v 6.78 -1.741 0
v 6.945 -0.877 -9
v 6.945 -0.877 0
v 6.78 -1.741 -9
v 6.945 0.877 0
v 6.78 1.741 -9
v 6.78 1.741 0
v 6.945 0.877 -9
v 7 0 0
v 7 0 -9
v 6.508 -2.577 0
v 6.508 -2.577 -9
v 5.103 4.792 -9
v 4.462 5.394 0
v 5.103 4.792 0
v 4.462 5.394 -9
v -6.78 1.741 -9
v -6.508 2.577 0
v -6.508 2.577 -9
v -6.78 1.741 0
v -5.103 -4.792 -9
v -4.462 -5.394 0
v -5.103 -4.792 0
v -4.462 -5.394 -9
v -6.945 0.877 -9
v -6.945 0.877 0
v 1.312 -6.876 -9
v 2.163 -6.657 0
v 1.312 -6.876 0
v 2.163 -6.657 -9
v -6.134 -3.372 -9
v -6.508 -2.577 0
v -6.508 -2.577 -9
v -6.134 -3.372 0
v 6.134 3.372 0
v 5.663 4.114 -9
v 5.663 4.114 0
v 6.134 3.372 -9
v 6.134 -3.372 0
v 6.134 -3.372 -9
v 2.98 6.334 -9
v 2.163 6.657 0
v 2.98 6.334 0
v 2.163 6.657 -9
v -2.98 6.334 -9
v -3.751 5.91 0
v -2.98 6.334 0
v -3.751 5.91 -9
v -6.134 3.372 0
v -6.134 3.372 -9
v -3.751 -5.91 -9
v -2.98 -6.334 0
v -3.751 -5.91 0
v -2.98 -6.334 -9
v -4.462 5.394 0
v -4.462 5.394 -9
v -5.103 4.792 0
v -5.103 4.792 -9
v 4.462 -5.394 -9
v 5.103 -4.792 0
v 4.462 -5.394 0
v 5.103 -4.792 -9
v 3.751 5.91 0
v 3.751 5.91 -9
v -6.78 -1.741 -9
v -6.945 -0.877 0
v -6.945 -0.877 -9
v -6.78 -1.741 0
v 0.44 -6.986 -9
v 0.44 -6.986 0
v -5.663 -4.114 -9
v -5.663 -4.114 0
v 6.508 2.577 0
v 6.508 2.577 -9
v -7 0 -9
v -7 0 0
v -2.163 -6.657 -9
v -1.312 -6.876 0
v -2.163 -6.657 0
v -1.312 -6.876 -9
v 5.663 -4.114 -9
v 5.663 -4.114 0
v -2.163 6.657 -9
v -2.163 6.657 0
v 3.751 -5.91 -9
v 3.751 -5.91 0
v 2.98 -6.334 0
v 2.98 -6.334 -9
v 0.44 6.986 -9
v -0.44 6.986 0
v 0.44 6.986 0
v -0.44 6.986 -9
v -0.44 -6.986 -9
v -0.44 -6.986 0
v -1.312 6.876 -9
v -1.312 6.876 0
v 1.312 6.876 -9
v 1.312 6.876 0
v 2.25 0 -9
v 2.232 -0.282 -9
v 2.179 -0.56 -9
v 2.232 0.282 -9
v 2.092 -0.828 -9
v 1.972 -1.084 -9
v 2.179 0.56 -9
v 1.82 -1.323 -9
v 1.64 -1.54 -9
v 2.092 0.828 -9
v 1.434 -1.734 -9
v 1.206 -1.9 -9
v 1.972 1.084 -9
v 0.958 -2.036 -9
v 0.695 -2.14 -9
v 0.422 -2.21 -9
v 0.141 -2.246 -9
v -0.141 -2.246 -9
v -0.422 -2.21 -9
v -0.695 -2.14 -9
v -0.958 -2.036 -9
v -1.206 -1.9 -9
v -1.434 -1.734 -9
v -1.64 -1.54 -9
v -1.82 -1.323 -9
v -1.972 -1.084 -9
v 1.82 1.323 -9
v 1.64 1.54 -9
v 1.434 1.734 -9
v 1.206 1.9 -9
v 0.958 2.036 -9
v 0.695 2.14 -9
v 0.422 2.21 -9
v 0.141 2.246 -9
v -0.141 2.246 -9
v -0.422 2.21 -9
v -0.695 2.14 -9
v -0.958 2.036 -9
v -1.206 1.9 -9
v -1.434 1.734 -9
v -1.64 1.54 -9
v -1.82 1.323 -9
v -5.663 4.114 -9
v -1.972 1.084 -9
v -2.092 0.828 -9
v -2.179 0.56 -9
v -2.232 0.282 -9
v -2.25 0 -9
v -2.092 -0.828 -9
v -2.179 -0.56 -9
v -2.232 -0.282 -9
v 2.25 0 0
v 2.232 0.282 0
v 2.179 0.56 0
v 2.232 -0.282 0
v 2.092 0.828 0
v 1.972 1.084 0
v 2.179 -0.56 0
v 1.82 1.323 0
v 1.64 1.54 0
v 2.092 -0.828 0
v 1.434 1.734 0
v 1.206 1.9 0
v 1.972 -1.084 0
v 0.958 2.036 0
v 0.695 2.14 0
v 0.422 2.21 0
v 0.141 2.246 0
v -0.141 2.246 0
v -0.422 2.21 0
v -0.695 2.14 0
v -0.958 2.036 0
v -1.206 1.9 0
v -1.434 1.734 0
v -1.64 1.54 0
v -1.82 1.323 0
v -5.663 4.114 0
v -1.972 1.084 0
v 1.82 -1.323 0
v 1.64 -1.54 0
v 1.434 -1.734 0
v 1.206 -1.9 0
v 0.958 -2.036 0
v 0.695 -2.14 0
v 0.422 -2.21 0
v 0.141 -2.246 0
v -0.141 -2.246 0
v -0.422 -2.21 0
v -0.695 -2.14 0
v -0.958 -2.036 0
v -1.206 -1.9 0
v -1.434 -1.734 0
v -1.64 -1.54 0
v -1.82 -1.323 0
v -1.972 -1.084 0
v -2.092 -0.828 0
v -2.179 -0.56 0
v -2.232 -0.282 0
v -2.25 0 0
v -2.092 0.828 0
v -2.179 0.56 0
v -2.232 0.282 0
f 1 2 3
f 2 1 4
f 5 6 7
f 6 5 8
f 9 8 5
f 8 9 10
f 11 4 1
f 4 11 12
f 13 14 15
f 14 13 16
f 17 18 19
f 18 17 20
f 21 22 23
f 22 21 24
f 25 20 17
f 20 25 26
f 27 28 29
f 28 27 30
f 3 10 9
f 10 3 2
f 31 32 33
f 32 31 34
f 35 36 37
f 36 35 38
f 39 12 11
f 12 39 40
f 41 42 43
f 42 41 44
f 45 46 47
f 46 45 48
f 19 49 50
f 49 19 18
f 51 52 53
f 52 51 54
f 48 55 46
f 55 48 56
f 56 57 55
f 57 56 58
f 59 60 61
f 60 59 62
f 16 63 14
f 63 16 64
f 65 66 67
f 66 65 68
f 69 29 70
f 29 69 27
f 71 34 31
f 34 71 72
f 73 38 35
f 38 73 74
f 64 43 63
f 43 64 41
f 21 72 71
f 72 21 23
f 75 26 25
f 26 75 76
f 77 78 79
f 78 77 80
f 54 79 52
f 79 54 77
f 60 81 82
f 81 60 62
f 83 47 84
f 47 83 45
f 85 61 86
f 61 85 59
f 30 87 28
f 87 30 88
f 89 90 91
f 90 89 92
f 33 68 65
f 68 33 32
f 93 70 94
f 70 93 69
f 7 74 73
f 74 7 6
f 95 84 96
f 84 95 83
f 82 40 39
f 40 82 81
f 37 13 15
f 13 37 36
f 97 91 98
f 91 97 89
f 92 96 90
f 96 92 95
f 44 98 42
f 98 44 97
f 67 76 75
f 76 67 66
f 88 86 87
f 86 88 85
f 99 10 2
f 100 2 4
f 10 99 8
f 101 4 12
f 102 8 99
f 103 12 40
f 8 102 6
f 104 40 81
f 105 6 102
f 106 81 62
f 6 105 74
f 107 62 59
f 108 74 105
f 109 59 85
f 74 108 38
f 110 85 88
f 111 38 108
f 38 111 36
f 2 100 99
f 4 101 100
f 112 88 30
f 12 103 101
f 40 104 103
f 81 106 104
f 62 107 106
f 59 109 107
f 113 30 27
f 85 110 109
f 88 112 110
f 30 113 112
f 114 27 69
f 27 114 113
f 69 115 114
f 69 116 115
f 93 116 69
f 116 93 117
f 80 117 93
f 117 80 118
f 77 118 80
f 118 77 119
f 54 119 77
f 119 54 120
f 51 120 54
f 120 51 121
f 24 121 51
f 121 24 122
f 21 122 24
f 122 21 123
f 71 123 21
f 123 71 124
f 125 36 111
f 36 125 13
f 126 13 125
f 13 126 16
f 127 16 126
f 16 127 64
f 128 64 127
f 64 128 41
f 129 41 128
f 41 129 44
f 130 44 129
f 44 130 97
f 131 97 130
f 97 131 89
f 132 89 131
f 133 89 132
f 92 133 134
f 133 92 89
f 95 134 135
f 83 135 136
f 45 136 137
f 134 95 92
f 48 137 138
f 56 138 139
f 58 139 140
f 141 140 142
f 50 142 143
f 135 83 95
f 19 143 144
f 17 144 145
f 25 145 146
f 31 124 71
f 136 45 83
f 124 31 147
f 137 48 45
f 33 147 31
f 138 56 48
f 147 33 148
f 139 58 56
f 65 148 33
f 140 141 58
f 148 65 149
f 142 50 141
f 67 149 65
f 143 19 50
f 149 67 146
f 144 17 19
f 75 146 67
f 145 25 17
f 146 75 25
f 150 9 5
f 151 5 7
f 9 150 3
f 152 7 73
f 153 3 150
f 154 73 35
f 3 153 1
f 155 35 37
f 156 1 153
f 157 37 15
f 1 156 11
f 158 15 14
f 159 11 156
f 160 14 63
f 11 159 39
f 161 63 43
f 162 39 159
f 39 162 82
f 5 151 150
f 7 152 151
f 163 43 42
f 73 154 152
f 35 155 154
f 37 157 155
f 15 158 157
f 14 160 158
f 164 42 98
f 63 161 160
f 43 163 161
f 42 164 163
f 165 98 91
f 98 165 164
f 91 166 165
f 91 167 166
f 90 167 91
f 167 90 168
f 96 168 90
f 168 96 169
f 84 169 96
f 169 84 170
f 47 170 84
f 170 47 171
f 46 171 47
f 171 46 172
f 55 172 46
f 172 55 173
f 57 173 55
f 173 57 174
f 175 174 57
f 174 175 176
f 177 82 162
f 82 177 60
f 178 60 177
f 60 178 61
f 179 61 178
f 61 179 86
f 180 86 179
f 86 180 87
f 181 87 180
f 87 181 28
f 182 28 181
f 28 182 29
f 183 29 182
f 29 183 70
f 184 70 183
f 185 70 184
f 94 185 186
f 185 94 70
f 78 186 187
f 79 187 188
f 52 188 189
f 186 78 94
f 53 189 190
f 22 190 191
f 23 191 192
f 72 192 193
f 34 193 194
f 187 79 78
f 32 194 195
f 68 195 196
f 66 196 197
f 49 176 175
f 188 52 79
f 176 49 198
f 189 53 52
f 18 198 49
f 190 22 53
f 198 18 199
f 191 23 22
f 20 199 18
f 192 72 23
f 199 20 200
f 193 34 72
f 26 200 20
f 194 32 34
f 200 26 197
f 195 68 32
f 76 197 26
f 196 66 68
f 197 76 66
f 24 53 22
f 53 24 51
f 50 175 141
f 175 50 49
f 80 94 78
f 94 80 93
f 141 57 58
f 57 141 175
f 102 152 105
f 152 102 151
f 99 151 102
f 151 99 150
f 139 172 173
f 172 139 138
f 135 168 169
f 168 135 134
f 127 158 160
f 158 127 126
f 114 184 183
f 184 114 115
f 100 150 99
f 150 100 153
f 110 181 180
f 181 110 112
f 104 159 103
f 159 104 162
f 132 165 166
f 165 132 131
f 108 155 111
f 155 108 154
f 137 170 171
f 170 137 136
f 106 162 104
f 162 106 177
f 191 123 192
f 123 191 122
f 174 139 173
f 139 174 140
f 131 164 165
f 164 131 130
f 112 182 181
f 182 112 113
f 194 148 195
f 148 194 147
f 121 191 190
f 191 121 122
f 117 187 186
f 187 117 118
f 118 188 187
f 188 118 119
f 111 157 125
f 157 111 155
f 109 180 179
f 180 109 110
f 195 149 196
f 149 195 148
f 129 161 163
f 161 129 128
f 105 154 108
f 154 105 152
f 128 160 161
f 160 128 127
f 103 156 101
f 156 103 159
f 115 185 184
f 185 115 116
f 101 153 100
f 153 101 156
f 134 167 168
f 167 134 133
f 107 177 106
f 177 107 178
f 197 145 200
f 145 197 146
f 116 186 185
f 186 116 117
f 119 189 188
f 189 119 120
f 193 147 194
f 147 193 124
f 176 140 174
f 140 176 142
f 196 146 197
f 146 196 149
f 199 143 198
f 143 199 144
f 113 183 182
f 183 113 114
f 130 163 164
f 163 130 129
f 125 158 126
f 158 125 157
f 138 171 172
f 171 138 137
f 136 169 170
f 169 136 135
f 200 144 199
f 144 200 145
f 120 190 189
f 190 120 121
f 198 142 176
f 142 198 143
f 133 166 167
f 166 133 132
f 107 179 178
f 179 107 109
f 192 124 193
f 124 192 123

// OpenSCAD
$fn = 50;


difference() {
	union() {
		translate(v = [0, 0, -9.0000000000]) {
			cylinder(h = 9, r = 7.0000000000);
		}
		cylinder(h = 0, r = 10.0000000000);
	}
	union() {
		#translate(v = [0, 0, -9]) {
			cylinder(h = 9, r = 2.2500000000);
		}
	}
}
